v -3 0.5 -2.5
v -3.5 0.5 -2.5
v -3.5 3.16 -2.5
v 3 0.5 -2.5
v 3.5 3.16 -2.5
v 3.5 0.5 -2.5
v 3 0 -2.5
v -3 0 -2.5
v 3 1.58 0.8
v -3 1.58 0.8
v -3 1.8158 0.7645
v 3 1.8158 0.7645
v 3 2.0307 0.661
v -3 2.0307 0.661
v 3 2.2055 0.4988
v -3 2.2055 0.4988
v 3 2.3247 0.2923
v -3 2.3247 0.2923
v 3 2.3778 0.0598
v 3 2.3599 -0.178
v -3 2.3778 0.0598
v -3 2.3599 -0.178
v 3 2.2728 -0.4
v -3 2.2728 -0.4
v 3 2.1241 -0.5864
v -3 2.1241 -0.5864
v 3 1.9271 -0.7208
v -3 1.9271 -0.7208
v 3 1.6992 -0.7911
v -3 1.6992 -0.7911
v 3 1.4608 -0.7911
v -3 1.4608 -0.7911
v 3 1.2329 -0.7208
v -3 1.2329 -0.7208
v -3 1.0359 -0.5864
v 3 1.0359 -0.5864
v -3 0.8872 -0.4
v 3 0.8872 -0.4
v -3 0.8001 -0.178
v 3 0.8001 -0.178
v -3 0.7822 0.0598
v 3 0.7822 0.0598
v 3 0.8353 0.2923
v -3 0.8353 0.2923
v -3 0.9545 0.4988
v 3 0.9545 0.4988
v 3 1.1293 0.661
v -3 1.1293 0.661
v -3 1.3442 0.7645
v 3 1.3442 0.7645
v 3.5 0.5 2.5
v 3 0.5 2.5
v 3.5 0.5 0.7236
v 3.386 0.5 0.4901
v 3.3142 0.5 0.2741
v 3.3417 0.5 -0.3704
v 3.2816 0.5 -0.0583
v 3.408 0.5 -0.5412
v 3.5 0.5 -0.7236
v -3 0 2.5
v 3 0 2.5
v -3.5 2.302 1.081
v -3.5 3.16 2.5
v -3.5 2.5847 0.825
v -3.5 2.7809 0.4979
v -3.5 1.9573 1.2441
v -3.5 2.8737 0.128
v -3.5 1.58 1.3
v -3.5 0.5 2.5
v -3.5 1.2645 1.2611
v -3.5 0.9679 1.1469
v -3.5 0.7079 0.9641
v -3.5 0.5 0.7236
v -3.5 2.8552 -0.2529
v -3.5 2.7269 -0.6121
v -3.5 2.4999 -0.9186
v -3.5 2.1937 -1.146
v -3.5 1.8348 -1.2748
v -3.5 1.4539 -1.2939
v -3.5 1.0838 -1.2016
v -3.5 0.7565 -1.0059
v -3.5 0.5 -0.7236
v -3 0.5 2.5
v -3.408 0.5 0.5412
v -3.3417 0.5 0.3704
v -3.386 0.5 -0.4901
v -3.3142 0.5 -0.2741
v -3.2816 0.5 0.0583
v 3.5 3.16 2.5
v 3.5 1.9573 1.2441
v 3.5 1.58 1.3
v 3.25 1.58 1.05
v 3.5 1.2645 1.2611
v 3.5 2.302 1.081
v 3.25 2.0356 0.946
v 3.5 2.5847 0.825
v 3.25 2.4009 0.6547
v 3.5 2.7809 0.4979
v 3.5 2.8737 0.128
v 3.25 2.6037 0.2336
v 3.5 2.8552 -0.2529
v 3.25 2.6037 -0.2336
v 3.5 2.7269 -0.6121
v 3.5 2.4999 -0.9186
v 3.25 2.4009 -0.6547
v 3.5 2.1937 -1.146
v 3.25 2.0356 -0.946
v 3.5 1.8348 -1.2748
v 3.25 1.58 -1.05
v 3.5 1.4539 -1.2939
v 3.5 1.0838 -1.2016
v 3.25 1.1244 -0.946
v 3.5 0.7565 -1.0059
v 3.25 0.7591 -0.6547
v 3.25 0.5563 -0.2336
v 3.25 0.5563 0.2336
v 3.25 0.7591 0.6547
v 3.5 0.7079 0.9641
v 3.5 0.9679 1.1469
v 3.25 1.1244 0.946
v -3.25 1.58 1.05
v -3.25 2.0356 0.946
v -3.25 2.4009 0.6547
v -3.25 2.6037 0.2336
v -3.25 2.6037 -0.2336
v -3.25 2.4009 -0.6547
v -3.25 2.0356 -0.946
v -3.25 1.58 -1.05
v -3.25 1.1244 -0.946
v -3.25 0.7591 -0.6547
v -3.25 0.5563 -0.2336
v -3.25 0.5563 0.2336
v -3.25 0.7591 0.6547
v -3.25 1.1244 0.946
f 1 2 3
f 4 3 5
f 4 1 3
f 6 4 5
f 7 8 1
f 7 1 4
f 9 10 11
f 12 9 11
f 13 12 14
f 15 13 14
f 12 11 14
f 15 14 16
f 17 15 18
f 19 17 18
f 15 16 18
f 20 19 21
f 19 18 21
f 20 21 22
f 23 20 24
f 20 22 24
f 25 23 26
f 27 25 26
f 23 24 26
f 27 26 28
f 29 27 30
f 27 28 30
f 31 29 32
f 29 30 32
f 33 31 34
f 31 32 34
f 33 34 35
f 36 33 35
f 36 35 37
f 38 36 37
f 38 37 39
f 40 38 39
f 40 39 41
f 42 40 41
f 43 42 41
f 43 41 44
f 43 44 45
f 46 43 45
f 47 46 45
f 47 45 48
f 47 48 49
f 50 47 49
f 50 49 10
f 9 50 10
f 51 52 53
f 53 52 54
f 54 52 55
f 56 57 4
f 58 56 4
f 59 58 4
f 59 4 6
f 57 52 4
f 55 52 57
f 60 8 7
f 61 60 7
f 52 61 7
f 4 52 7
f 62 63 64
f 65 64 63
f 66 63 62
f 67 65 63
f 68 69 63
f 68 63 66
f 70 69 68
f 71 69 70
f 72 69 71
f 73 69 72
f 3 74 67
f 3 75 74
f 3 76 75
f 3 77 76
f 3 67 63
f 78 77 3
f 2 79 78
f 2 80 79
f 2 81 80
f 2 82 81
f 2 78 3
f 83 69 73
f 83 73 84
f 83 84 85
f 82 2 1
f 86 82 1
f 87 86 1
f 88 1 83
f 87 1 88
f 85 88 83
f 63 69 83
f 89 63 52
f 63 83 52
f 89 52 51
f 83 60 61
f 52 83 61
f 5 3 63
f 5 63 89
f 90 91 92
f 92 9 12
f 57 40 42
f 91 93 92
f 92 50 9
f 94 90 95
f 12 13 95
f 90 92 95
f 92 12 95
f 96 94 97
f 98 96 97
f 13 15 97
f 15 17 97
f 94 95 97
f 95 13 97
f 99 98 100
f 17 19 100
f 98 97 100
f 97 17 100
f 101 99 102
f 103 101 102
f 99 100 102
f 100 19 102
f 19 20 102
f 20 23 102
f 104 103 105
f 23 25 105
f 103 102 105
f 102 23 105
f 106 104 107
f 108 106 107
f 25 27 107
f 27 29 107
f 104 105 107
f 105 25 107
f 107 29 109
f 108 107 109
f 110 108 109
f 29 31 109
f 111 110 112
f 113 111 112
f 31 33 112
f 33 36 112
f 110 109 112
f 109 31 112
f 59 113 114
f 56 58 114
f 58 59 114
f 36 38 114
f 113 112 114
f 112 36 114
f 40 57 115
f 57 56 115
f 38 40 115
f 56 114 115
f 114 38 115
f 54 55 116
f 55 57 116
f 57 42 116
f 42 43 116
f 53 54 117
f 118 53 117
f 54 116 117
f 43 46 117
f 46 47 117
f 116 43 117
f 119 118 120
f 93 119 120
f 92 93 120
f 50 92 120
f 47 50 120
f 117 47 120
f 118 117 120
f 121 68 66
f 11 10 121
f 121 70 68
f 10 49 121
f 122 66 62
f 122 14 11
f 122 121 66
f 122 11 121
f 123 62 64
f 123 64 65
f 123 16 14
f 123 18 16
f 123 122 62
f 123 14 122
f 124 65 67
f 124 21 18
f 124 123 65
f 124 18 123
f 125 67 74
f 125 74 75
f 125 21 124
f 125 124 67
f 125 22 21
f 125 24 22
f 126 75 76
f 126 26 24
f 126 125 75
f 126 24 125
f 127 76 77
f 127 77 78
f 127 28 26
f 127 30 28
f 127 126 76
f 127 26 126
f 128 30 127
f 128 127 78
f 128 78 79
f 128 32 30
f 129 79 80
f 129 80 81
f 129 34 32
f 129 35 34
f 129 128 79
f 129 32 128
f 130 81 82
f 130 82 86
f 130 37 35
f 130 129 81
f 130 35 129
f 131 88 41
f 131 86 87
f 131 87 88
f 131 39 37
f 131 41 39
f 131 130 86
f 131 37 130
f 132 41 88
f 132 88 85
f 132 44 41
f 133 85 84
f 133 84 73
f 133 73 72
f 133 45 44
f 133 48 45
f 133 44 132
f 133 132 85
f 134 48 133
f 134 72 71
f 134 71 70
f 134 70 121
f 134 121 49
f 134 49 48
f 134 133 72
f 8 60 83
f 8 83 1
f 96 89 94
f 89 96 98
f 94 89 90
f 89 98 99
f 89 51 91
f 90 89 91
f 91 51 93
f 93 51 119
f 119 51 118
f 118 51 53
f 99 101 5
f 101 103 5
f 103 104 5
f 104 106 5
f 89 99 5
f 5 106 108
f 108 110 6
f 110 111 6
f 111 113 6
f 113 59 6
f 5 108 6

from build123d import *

# Parameters (mm, degrees)
SKETCH1_W           = 6
SKETCH1_H           = 5
BOSS_EXTRUDE1_DEPTH = 0.5
SKETCH2_W           = 7
SKETCH2_H           = 5
BOSS_EXTRUDE2_DEPTH = 2.66
SKETCH3_R           = 0.8
CUT_EXTRUDE1_DEPTH  = 9.076855824
CHAMFER1_SIZE       = 0.5


with BuildPart() as part:
    # Sketch1 → Boss-Extrude1 (new body)
    with BuildSketch(Plane(origin=(0, 0, 0), x_dir=(1, 0, 0), z_dir=(0, 1, 0))):
        Rectangle(SKETCH1_W, SKETCH1_H)
    extrude(amount=BOSS_EXTRUDE1_DEPTH)

    # Sketch2 → Boss-Extrude2 (add)
    with BuildSketch(Plane(origin=(0, 0.5, 0), x_dir=(1, 0, 0), z_dir=(0, 1, 0))):
        Rectangle(SKETCH2_W, SKETCH2_H)
    extrude(amount=BOSS_EXTRUDE2_DEPTH)

    # Sketch3 → Cut-Extrude1 (cut, through all)
    with BuildSketch(Plane.ZY.offset(3.5)):
        with Locations((0, 1.58)):
            Circle(SKETCH3_R)
    extrude(amount=-CUT_EXTRUDE1_DEPTH, mode=Mode.SUBTRACT)

    # Chamfer1
    # the kernel refuses this chamfer: 0.5 mm, written as the material it takes off along each edge
    with BuildSketch(Plane(origin=(3.5, 1.58, 0), x_dir=(0, 0, 1), z_dir=(0, -1, 0))) as chamfer1_piece_1:
        Polygon((0.8 + CHAMFER1_SIZE, 0), (0.8, CHAMFER1_SIZE), (0.8, 0), align=None)
    revolve(axis=Axis((3.5, 1.58, 0), (-1, 0, 0)), mode=Mode.SUBTRACT)
    with BuildSketch(Plane(origin=(-3.5, 1.58, 0), x_dir=(0, 0, 1), z_dir=(0, -1, 0))) as chamfer1_piece_2:
        Polygon((0.8 + CHAMFER1_SIZE, 0), (0.8, -CHAMFER1_SIZE), (0.8, 0), align=None)
    revolve(axis=Axis((-3.5, 1.58, 0), (-1, 0, 0)), mode=Mode.SUBTRACT)


solid = part.part
